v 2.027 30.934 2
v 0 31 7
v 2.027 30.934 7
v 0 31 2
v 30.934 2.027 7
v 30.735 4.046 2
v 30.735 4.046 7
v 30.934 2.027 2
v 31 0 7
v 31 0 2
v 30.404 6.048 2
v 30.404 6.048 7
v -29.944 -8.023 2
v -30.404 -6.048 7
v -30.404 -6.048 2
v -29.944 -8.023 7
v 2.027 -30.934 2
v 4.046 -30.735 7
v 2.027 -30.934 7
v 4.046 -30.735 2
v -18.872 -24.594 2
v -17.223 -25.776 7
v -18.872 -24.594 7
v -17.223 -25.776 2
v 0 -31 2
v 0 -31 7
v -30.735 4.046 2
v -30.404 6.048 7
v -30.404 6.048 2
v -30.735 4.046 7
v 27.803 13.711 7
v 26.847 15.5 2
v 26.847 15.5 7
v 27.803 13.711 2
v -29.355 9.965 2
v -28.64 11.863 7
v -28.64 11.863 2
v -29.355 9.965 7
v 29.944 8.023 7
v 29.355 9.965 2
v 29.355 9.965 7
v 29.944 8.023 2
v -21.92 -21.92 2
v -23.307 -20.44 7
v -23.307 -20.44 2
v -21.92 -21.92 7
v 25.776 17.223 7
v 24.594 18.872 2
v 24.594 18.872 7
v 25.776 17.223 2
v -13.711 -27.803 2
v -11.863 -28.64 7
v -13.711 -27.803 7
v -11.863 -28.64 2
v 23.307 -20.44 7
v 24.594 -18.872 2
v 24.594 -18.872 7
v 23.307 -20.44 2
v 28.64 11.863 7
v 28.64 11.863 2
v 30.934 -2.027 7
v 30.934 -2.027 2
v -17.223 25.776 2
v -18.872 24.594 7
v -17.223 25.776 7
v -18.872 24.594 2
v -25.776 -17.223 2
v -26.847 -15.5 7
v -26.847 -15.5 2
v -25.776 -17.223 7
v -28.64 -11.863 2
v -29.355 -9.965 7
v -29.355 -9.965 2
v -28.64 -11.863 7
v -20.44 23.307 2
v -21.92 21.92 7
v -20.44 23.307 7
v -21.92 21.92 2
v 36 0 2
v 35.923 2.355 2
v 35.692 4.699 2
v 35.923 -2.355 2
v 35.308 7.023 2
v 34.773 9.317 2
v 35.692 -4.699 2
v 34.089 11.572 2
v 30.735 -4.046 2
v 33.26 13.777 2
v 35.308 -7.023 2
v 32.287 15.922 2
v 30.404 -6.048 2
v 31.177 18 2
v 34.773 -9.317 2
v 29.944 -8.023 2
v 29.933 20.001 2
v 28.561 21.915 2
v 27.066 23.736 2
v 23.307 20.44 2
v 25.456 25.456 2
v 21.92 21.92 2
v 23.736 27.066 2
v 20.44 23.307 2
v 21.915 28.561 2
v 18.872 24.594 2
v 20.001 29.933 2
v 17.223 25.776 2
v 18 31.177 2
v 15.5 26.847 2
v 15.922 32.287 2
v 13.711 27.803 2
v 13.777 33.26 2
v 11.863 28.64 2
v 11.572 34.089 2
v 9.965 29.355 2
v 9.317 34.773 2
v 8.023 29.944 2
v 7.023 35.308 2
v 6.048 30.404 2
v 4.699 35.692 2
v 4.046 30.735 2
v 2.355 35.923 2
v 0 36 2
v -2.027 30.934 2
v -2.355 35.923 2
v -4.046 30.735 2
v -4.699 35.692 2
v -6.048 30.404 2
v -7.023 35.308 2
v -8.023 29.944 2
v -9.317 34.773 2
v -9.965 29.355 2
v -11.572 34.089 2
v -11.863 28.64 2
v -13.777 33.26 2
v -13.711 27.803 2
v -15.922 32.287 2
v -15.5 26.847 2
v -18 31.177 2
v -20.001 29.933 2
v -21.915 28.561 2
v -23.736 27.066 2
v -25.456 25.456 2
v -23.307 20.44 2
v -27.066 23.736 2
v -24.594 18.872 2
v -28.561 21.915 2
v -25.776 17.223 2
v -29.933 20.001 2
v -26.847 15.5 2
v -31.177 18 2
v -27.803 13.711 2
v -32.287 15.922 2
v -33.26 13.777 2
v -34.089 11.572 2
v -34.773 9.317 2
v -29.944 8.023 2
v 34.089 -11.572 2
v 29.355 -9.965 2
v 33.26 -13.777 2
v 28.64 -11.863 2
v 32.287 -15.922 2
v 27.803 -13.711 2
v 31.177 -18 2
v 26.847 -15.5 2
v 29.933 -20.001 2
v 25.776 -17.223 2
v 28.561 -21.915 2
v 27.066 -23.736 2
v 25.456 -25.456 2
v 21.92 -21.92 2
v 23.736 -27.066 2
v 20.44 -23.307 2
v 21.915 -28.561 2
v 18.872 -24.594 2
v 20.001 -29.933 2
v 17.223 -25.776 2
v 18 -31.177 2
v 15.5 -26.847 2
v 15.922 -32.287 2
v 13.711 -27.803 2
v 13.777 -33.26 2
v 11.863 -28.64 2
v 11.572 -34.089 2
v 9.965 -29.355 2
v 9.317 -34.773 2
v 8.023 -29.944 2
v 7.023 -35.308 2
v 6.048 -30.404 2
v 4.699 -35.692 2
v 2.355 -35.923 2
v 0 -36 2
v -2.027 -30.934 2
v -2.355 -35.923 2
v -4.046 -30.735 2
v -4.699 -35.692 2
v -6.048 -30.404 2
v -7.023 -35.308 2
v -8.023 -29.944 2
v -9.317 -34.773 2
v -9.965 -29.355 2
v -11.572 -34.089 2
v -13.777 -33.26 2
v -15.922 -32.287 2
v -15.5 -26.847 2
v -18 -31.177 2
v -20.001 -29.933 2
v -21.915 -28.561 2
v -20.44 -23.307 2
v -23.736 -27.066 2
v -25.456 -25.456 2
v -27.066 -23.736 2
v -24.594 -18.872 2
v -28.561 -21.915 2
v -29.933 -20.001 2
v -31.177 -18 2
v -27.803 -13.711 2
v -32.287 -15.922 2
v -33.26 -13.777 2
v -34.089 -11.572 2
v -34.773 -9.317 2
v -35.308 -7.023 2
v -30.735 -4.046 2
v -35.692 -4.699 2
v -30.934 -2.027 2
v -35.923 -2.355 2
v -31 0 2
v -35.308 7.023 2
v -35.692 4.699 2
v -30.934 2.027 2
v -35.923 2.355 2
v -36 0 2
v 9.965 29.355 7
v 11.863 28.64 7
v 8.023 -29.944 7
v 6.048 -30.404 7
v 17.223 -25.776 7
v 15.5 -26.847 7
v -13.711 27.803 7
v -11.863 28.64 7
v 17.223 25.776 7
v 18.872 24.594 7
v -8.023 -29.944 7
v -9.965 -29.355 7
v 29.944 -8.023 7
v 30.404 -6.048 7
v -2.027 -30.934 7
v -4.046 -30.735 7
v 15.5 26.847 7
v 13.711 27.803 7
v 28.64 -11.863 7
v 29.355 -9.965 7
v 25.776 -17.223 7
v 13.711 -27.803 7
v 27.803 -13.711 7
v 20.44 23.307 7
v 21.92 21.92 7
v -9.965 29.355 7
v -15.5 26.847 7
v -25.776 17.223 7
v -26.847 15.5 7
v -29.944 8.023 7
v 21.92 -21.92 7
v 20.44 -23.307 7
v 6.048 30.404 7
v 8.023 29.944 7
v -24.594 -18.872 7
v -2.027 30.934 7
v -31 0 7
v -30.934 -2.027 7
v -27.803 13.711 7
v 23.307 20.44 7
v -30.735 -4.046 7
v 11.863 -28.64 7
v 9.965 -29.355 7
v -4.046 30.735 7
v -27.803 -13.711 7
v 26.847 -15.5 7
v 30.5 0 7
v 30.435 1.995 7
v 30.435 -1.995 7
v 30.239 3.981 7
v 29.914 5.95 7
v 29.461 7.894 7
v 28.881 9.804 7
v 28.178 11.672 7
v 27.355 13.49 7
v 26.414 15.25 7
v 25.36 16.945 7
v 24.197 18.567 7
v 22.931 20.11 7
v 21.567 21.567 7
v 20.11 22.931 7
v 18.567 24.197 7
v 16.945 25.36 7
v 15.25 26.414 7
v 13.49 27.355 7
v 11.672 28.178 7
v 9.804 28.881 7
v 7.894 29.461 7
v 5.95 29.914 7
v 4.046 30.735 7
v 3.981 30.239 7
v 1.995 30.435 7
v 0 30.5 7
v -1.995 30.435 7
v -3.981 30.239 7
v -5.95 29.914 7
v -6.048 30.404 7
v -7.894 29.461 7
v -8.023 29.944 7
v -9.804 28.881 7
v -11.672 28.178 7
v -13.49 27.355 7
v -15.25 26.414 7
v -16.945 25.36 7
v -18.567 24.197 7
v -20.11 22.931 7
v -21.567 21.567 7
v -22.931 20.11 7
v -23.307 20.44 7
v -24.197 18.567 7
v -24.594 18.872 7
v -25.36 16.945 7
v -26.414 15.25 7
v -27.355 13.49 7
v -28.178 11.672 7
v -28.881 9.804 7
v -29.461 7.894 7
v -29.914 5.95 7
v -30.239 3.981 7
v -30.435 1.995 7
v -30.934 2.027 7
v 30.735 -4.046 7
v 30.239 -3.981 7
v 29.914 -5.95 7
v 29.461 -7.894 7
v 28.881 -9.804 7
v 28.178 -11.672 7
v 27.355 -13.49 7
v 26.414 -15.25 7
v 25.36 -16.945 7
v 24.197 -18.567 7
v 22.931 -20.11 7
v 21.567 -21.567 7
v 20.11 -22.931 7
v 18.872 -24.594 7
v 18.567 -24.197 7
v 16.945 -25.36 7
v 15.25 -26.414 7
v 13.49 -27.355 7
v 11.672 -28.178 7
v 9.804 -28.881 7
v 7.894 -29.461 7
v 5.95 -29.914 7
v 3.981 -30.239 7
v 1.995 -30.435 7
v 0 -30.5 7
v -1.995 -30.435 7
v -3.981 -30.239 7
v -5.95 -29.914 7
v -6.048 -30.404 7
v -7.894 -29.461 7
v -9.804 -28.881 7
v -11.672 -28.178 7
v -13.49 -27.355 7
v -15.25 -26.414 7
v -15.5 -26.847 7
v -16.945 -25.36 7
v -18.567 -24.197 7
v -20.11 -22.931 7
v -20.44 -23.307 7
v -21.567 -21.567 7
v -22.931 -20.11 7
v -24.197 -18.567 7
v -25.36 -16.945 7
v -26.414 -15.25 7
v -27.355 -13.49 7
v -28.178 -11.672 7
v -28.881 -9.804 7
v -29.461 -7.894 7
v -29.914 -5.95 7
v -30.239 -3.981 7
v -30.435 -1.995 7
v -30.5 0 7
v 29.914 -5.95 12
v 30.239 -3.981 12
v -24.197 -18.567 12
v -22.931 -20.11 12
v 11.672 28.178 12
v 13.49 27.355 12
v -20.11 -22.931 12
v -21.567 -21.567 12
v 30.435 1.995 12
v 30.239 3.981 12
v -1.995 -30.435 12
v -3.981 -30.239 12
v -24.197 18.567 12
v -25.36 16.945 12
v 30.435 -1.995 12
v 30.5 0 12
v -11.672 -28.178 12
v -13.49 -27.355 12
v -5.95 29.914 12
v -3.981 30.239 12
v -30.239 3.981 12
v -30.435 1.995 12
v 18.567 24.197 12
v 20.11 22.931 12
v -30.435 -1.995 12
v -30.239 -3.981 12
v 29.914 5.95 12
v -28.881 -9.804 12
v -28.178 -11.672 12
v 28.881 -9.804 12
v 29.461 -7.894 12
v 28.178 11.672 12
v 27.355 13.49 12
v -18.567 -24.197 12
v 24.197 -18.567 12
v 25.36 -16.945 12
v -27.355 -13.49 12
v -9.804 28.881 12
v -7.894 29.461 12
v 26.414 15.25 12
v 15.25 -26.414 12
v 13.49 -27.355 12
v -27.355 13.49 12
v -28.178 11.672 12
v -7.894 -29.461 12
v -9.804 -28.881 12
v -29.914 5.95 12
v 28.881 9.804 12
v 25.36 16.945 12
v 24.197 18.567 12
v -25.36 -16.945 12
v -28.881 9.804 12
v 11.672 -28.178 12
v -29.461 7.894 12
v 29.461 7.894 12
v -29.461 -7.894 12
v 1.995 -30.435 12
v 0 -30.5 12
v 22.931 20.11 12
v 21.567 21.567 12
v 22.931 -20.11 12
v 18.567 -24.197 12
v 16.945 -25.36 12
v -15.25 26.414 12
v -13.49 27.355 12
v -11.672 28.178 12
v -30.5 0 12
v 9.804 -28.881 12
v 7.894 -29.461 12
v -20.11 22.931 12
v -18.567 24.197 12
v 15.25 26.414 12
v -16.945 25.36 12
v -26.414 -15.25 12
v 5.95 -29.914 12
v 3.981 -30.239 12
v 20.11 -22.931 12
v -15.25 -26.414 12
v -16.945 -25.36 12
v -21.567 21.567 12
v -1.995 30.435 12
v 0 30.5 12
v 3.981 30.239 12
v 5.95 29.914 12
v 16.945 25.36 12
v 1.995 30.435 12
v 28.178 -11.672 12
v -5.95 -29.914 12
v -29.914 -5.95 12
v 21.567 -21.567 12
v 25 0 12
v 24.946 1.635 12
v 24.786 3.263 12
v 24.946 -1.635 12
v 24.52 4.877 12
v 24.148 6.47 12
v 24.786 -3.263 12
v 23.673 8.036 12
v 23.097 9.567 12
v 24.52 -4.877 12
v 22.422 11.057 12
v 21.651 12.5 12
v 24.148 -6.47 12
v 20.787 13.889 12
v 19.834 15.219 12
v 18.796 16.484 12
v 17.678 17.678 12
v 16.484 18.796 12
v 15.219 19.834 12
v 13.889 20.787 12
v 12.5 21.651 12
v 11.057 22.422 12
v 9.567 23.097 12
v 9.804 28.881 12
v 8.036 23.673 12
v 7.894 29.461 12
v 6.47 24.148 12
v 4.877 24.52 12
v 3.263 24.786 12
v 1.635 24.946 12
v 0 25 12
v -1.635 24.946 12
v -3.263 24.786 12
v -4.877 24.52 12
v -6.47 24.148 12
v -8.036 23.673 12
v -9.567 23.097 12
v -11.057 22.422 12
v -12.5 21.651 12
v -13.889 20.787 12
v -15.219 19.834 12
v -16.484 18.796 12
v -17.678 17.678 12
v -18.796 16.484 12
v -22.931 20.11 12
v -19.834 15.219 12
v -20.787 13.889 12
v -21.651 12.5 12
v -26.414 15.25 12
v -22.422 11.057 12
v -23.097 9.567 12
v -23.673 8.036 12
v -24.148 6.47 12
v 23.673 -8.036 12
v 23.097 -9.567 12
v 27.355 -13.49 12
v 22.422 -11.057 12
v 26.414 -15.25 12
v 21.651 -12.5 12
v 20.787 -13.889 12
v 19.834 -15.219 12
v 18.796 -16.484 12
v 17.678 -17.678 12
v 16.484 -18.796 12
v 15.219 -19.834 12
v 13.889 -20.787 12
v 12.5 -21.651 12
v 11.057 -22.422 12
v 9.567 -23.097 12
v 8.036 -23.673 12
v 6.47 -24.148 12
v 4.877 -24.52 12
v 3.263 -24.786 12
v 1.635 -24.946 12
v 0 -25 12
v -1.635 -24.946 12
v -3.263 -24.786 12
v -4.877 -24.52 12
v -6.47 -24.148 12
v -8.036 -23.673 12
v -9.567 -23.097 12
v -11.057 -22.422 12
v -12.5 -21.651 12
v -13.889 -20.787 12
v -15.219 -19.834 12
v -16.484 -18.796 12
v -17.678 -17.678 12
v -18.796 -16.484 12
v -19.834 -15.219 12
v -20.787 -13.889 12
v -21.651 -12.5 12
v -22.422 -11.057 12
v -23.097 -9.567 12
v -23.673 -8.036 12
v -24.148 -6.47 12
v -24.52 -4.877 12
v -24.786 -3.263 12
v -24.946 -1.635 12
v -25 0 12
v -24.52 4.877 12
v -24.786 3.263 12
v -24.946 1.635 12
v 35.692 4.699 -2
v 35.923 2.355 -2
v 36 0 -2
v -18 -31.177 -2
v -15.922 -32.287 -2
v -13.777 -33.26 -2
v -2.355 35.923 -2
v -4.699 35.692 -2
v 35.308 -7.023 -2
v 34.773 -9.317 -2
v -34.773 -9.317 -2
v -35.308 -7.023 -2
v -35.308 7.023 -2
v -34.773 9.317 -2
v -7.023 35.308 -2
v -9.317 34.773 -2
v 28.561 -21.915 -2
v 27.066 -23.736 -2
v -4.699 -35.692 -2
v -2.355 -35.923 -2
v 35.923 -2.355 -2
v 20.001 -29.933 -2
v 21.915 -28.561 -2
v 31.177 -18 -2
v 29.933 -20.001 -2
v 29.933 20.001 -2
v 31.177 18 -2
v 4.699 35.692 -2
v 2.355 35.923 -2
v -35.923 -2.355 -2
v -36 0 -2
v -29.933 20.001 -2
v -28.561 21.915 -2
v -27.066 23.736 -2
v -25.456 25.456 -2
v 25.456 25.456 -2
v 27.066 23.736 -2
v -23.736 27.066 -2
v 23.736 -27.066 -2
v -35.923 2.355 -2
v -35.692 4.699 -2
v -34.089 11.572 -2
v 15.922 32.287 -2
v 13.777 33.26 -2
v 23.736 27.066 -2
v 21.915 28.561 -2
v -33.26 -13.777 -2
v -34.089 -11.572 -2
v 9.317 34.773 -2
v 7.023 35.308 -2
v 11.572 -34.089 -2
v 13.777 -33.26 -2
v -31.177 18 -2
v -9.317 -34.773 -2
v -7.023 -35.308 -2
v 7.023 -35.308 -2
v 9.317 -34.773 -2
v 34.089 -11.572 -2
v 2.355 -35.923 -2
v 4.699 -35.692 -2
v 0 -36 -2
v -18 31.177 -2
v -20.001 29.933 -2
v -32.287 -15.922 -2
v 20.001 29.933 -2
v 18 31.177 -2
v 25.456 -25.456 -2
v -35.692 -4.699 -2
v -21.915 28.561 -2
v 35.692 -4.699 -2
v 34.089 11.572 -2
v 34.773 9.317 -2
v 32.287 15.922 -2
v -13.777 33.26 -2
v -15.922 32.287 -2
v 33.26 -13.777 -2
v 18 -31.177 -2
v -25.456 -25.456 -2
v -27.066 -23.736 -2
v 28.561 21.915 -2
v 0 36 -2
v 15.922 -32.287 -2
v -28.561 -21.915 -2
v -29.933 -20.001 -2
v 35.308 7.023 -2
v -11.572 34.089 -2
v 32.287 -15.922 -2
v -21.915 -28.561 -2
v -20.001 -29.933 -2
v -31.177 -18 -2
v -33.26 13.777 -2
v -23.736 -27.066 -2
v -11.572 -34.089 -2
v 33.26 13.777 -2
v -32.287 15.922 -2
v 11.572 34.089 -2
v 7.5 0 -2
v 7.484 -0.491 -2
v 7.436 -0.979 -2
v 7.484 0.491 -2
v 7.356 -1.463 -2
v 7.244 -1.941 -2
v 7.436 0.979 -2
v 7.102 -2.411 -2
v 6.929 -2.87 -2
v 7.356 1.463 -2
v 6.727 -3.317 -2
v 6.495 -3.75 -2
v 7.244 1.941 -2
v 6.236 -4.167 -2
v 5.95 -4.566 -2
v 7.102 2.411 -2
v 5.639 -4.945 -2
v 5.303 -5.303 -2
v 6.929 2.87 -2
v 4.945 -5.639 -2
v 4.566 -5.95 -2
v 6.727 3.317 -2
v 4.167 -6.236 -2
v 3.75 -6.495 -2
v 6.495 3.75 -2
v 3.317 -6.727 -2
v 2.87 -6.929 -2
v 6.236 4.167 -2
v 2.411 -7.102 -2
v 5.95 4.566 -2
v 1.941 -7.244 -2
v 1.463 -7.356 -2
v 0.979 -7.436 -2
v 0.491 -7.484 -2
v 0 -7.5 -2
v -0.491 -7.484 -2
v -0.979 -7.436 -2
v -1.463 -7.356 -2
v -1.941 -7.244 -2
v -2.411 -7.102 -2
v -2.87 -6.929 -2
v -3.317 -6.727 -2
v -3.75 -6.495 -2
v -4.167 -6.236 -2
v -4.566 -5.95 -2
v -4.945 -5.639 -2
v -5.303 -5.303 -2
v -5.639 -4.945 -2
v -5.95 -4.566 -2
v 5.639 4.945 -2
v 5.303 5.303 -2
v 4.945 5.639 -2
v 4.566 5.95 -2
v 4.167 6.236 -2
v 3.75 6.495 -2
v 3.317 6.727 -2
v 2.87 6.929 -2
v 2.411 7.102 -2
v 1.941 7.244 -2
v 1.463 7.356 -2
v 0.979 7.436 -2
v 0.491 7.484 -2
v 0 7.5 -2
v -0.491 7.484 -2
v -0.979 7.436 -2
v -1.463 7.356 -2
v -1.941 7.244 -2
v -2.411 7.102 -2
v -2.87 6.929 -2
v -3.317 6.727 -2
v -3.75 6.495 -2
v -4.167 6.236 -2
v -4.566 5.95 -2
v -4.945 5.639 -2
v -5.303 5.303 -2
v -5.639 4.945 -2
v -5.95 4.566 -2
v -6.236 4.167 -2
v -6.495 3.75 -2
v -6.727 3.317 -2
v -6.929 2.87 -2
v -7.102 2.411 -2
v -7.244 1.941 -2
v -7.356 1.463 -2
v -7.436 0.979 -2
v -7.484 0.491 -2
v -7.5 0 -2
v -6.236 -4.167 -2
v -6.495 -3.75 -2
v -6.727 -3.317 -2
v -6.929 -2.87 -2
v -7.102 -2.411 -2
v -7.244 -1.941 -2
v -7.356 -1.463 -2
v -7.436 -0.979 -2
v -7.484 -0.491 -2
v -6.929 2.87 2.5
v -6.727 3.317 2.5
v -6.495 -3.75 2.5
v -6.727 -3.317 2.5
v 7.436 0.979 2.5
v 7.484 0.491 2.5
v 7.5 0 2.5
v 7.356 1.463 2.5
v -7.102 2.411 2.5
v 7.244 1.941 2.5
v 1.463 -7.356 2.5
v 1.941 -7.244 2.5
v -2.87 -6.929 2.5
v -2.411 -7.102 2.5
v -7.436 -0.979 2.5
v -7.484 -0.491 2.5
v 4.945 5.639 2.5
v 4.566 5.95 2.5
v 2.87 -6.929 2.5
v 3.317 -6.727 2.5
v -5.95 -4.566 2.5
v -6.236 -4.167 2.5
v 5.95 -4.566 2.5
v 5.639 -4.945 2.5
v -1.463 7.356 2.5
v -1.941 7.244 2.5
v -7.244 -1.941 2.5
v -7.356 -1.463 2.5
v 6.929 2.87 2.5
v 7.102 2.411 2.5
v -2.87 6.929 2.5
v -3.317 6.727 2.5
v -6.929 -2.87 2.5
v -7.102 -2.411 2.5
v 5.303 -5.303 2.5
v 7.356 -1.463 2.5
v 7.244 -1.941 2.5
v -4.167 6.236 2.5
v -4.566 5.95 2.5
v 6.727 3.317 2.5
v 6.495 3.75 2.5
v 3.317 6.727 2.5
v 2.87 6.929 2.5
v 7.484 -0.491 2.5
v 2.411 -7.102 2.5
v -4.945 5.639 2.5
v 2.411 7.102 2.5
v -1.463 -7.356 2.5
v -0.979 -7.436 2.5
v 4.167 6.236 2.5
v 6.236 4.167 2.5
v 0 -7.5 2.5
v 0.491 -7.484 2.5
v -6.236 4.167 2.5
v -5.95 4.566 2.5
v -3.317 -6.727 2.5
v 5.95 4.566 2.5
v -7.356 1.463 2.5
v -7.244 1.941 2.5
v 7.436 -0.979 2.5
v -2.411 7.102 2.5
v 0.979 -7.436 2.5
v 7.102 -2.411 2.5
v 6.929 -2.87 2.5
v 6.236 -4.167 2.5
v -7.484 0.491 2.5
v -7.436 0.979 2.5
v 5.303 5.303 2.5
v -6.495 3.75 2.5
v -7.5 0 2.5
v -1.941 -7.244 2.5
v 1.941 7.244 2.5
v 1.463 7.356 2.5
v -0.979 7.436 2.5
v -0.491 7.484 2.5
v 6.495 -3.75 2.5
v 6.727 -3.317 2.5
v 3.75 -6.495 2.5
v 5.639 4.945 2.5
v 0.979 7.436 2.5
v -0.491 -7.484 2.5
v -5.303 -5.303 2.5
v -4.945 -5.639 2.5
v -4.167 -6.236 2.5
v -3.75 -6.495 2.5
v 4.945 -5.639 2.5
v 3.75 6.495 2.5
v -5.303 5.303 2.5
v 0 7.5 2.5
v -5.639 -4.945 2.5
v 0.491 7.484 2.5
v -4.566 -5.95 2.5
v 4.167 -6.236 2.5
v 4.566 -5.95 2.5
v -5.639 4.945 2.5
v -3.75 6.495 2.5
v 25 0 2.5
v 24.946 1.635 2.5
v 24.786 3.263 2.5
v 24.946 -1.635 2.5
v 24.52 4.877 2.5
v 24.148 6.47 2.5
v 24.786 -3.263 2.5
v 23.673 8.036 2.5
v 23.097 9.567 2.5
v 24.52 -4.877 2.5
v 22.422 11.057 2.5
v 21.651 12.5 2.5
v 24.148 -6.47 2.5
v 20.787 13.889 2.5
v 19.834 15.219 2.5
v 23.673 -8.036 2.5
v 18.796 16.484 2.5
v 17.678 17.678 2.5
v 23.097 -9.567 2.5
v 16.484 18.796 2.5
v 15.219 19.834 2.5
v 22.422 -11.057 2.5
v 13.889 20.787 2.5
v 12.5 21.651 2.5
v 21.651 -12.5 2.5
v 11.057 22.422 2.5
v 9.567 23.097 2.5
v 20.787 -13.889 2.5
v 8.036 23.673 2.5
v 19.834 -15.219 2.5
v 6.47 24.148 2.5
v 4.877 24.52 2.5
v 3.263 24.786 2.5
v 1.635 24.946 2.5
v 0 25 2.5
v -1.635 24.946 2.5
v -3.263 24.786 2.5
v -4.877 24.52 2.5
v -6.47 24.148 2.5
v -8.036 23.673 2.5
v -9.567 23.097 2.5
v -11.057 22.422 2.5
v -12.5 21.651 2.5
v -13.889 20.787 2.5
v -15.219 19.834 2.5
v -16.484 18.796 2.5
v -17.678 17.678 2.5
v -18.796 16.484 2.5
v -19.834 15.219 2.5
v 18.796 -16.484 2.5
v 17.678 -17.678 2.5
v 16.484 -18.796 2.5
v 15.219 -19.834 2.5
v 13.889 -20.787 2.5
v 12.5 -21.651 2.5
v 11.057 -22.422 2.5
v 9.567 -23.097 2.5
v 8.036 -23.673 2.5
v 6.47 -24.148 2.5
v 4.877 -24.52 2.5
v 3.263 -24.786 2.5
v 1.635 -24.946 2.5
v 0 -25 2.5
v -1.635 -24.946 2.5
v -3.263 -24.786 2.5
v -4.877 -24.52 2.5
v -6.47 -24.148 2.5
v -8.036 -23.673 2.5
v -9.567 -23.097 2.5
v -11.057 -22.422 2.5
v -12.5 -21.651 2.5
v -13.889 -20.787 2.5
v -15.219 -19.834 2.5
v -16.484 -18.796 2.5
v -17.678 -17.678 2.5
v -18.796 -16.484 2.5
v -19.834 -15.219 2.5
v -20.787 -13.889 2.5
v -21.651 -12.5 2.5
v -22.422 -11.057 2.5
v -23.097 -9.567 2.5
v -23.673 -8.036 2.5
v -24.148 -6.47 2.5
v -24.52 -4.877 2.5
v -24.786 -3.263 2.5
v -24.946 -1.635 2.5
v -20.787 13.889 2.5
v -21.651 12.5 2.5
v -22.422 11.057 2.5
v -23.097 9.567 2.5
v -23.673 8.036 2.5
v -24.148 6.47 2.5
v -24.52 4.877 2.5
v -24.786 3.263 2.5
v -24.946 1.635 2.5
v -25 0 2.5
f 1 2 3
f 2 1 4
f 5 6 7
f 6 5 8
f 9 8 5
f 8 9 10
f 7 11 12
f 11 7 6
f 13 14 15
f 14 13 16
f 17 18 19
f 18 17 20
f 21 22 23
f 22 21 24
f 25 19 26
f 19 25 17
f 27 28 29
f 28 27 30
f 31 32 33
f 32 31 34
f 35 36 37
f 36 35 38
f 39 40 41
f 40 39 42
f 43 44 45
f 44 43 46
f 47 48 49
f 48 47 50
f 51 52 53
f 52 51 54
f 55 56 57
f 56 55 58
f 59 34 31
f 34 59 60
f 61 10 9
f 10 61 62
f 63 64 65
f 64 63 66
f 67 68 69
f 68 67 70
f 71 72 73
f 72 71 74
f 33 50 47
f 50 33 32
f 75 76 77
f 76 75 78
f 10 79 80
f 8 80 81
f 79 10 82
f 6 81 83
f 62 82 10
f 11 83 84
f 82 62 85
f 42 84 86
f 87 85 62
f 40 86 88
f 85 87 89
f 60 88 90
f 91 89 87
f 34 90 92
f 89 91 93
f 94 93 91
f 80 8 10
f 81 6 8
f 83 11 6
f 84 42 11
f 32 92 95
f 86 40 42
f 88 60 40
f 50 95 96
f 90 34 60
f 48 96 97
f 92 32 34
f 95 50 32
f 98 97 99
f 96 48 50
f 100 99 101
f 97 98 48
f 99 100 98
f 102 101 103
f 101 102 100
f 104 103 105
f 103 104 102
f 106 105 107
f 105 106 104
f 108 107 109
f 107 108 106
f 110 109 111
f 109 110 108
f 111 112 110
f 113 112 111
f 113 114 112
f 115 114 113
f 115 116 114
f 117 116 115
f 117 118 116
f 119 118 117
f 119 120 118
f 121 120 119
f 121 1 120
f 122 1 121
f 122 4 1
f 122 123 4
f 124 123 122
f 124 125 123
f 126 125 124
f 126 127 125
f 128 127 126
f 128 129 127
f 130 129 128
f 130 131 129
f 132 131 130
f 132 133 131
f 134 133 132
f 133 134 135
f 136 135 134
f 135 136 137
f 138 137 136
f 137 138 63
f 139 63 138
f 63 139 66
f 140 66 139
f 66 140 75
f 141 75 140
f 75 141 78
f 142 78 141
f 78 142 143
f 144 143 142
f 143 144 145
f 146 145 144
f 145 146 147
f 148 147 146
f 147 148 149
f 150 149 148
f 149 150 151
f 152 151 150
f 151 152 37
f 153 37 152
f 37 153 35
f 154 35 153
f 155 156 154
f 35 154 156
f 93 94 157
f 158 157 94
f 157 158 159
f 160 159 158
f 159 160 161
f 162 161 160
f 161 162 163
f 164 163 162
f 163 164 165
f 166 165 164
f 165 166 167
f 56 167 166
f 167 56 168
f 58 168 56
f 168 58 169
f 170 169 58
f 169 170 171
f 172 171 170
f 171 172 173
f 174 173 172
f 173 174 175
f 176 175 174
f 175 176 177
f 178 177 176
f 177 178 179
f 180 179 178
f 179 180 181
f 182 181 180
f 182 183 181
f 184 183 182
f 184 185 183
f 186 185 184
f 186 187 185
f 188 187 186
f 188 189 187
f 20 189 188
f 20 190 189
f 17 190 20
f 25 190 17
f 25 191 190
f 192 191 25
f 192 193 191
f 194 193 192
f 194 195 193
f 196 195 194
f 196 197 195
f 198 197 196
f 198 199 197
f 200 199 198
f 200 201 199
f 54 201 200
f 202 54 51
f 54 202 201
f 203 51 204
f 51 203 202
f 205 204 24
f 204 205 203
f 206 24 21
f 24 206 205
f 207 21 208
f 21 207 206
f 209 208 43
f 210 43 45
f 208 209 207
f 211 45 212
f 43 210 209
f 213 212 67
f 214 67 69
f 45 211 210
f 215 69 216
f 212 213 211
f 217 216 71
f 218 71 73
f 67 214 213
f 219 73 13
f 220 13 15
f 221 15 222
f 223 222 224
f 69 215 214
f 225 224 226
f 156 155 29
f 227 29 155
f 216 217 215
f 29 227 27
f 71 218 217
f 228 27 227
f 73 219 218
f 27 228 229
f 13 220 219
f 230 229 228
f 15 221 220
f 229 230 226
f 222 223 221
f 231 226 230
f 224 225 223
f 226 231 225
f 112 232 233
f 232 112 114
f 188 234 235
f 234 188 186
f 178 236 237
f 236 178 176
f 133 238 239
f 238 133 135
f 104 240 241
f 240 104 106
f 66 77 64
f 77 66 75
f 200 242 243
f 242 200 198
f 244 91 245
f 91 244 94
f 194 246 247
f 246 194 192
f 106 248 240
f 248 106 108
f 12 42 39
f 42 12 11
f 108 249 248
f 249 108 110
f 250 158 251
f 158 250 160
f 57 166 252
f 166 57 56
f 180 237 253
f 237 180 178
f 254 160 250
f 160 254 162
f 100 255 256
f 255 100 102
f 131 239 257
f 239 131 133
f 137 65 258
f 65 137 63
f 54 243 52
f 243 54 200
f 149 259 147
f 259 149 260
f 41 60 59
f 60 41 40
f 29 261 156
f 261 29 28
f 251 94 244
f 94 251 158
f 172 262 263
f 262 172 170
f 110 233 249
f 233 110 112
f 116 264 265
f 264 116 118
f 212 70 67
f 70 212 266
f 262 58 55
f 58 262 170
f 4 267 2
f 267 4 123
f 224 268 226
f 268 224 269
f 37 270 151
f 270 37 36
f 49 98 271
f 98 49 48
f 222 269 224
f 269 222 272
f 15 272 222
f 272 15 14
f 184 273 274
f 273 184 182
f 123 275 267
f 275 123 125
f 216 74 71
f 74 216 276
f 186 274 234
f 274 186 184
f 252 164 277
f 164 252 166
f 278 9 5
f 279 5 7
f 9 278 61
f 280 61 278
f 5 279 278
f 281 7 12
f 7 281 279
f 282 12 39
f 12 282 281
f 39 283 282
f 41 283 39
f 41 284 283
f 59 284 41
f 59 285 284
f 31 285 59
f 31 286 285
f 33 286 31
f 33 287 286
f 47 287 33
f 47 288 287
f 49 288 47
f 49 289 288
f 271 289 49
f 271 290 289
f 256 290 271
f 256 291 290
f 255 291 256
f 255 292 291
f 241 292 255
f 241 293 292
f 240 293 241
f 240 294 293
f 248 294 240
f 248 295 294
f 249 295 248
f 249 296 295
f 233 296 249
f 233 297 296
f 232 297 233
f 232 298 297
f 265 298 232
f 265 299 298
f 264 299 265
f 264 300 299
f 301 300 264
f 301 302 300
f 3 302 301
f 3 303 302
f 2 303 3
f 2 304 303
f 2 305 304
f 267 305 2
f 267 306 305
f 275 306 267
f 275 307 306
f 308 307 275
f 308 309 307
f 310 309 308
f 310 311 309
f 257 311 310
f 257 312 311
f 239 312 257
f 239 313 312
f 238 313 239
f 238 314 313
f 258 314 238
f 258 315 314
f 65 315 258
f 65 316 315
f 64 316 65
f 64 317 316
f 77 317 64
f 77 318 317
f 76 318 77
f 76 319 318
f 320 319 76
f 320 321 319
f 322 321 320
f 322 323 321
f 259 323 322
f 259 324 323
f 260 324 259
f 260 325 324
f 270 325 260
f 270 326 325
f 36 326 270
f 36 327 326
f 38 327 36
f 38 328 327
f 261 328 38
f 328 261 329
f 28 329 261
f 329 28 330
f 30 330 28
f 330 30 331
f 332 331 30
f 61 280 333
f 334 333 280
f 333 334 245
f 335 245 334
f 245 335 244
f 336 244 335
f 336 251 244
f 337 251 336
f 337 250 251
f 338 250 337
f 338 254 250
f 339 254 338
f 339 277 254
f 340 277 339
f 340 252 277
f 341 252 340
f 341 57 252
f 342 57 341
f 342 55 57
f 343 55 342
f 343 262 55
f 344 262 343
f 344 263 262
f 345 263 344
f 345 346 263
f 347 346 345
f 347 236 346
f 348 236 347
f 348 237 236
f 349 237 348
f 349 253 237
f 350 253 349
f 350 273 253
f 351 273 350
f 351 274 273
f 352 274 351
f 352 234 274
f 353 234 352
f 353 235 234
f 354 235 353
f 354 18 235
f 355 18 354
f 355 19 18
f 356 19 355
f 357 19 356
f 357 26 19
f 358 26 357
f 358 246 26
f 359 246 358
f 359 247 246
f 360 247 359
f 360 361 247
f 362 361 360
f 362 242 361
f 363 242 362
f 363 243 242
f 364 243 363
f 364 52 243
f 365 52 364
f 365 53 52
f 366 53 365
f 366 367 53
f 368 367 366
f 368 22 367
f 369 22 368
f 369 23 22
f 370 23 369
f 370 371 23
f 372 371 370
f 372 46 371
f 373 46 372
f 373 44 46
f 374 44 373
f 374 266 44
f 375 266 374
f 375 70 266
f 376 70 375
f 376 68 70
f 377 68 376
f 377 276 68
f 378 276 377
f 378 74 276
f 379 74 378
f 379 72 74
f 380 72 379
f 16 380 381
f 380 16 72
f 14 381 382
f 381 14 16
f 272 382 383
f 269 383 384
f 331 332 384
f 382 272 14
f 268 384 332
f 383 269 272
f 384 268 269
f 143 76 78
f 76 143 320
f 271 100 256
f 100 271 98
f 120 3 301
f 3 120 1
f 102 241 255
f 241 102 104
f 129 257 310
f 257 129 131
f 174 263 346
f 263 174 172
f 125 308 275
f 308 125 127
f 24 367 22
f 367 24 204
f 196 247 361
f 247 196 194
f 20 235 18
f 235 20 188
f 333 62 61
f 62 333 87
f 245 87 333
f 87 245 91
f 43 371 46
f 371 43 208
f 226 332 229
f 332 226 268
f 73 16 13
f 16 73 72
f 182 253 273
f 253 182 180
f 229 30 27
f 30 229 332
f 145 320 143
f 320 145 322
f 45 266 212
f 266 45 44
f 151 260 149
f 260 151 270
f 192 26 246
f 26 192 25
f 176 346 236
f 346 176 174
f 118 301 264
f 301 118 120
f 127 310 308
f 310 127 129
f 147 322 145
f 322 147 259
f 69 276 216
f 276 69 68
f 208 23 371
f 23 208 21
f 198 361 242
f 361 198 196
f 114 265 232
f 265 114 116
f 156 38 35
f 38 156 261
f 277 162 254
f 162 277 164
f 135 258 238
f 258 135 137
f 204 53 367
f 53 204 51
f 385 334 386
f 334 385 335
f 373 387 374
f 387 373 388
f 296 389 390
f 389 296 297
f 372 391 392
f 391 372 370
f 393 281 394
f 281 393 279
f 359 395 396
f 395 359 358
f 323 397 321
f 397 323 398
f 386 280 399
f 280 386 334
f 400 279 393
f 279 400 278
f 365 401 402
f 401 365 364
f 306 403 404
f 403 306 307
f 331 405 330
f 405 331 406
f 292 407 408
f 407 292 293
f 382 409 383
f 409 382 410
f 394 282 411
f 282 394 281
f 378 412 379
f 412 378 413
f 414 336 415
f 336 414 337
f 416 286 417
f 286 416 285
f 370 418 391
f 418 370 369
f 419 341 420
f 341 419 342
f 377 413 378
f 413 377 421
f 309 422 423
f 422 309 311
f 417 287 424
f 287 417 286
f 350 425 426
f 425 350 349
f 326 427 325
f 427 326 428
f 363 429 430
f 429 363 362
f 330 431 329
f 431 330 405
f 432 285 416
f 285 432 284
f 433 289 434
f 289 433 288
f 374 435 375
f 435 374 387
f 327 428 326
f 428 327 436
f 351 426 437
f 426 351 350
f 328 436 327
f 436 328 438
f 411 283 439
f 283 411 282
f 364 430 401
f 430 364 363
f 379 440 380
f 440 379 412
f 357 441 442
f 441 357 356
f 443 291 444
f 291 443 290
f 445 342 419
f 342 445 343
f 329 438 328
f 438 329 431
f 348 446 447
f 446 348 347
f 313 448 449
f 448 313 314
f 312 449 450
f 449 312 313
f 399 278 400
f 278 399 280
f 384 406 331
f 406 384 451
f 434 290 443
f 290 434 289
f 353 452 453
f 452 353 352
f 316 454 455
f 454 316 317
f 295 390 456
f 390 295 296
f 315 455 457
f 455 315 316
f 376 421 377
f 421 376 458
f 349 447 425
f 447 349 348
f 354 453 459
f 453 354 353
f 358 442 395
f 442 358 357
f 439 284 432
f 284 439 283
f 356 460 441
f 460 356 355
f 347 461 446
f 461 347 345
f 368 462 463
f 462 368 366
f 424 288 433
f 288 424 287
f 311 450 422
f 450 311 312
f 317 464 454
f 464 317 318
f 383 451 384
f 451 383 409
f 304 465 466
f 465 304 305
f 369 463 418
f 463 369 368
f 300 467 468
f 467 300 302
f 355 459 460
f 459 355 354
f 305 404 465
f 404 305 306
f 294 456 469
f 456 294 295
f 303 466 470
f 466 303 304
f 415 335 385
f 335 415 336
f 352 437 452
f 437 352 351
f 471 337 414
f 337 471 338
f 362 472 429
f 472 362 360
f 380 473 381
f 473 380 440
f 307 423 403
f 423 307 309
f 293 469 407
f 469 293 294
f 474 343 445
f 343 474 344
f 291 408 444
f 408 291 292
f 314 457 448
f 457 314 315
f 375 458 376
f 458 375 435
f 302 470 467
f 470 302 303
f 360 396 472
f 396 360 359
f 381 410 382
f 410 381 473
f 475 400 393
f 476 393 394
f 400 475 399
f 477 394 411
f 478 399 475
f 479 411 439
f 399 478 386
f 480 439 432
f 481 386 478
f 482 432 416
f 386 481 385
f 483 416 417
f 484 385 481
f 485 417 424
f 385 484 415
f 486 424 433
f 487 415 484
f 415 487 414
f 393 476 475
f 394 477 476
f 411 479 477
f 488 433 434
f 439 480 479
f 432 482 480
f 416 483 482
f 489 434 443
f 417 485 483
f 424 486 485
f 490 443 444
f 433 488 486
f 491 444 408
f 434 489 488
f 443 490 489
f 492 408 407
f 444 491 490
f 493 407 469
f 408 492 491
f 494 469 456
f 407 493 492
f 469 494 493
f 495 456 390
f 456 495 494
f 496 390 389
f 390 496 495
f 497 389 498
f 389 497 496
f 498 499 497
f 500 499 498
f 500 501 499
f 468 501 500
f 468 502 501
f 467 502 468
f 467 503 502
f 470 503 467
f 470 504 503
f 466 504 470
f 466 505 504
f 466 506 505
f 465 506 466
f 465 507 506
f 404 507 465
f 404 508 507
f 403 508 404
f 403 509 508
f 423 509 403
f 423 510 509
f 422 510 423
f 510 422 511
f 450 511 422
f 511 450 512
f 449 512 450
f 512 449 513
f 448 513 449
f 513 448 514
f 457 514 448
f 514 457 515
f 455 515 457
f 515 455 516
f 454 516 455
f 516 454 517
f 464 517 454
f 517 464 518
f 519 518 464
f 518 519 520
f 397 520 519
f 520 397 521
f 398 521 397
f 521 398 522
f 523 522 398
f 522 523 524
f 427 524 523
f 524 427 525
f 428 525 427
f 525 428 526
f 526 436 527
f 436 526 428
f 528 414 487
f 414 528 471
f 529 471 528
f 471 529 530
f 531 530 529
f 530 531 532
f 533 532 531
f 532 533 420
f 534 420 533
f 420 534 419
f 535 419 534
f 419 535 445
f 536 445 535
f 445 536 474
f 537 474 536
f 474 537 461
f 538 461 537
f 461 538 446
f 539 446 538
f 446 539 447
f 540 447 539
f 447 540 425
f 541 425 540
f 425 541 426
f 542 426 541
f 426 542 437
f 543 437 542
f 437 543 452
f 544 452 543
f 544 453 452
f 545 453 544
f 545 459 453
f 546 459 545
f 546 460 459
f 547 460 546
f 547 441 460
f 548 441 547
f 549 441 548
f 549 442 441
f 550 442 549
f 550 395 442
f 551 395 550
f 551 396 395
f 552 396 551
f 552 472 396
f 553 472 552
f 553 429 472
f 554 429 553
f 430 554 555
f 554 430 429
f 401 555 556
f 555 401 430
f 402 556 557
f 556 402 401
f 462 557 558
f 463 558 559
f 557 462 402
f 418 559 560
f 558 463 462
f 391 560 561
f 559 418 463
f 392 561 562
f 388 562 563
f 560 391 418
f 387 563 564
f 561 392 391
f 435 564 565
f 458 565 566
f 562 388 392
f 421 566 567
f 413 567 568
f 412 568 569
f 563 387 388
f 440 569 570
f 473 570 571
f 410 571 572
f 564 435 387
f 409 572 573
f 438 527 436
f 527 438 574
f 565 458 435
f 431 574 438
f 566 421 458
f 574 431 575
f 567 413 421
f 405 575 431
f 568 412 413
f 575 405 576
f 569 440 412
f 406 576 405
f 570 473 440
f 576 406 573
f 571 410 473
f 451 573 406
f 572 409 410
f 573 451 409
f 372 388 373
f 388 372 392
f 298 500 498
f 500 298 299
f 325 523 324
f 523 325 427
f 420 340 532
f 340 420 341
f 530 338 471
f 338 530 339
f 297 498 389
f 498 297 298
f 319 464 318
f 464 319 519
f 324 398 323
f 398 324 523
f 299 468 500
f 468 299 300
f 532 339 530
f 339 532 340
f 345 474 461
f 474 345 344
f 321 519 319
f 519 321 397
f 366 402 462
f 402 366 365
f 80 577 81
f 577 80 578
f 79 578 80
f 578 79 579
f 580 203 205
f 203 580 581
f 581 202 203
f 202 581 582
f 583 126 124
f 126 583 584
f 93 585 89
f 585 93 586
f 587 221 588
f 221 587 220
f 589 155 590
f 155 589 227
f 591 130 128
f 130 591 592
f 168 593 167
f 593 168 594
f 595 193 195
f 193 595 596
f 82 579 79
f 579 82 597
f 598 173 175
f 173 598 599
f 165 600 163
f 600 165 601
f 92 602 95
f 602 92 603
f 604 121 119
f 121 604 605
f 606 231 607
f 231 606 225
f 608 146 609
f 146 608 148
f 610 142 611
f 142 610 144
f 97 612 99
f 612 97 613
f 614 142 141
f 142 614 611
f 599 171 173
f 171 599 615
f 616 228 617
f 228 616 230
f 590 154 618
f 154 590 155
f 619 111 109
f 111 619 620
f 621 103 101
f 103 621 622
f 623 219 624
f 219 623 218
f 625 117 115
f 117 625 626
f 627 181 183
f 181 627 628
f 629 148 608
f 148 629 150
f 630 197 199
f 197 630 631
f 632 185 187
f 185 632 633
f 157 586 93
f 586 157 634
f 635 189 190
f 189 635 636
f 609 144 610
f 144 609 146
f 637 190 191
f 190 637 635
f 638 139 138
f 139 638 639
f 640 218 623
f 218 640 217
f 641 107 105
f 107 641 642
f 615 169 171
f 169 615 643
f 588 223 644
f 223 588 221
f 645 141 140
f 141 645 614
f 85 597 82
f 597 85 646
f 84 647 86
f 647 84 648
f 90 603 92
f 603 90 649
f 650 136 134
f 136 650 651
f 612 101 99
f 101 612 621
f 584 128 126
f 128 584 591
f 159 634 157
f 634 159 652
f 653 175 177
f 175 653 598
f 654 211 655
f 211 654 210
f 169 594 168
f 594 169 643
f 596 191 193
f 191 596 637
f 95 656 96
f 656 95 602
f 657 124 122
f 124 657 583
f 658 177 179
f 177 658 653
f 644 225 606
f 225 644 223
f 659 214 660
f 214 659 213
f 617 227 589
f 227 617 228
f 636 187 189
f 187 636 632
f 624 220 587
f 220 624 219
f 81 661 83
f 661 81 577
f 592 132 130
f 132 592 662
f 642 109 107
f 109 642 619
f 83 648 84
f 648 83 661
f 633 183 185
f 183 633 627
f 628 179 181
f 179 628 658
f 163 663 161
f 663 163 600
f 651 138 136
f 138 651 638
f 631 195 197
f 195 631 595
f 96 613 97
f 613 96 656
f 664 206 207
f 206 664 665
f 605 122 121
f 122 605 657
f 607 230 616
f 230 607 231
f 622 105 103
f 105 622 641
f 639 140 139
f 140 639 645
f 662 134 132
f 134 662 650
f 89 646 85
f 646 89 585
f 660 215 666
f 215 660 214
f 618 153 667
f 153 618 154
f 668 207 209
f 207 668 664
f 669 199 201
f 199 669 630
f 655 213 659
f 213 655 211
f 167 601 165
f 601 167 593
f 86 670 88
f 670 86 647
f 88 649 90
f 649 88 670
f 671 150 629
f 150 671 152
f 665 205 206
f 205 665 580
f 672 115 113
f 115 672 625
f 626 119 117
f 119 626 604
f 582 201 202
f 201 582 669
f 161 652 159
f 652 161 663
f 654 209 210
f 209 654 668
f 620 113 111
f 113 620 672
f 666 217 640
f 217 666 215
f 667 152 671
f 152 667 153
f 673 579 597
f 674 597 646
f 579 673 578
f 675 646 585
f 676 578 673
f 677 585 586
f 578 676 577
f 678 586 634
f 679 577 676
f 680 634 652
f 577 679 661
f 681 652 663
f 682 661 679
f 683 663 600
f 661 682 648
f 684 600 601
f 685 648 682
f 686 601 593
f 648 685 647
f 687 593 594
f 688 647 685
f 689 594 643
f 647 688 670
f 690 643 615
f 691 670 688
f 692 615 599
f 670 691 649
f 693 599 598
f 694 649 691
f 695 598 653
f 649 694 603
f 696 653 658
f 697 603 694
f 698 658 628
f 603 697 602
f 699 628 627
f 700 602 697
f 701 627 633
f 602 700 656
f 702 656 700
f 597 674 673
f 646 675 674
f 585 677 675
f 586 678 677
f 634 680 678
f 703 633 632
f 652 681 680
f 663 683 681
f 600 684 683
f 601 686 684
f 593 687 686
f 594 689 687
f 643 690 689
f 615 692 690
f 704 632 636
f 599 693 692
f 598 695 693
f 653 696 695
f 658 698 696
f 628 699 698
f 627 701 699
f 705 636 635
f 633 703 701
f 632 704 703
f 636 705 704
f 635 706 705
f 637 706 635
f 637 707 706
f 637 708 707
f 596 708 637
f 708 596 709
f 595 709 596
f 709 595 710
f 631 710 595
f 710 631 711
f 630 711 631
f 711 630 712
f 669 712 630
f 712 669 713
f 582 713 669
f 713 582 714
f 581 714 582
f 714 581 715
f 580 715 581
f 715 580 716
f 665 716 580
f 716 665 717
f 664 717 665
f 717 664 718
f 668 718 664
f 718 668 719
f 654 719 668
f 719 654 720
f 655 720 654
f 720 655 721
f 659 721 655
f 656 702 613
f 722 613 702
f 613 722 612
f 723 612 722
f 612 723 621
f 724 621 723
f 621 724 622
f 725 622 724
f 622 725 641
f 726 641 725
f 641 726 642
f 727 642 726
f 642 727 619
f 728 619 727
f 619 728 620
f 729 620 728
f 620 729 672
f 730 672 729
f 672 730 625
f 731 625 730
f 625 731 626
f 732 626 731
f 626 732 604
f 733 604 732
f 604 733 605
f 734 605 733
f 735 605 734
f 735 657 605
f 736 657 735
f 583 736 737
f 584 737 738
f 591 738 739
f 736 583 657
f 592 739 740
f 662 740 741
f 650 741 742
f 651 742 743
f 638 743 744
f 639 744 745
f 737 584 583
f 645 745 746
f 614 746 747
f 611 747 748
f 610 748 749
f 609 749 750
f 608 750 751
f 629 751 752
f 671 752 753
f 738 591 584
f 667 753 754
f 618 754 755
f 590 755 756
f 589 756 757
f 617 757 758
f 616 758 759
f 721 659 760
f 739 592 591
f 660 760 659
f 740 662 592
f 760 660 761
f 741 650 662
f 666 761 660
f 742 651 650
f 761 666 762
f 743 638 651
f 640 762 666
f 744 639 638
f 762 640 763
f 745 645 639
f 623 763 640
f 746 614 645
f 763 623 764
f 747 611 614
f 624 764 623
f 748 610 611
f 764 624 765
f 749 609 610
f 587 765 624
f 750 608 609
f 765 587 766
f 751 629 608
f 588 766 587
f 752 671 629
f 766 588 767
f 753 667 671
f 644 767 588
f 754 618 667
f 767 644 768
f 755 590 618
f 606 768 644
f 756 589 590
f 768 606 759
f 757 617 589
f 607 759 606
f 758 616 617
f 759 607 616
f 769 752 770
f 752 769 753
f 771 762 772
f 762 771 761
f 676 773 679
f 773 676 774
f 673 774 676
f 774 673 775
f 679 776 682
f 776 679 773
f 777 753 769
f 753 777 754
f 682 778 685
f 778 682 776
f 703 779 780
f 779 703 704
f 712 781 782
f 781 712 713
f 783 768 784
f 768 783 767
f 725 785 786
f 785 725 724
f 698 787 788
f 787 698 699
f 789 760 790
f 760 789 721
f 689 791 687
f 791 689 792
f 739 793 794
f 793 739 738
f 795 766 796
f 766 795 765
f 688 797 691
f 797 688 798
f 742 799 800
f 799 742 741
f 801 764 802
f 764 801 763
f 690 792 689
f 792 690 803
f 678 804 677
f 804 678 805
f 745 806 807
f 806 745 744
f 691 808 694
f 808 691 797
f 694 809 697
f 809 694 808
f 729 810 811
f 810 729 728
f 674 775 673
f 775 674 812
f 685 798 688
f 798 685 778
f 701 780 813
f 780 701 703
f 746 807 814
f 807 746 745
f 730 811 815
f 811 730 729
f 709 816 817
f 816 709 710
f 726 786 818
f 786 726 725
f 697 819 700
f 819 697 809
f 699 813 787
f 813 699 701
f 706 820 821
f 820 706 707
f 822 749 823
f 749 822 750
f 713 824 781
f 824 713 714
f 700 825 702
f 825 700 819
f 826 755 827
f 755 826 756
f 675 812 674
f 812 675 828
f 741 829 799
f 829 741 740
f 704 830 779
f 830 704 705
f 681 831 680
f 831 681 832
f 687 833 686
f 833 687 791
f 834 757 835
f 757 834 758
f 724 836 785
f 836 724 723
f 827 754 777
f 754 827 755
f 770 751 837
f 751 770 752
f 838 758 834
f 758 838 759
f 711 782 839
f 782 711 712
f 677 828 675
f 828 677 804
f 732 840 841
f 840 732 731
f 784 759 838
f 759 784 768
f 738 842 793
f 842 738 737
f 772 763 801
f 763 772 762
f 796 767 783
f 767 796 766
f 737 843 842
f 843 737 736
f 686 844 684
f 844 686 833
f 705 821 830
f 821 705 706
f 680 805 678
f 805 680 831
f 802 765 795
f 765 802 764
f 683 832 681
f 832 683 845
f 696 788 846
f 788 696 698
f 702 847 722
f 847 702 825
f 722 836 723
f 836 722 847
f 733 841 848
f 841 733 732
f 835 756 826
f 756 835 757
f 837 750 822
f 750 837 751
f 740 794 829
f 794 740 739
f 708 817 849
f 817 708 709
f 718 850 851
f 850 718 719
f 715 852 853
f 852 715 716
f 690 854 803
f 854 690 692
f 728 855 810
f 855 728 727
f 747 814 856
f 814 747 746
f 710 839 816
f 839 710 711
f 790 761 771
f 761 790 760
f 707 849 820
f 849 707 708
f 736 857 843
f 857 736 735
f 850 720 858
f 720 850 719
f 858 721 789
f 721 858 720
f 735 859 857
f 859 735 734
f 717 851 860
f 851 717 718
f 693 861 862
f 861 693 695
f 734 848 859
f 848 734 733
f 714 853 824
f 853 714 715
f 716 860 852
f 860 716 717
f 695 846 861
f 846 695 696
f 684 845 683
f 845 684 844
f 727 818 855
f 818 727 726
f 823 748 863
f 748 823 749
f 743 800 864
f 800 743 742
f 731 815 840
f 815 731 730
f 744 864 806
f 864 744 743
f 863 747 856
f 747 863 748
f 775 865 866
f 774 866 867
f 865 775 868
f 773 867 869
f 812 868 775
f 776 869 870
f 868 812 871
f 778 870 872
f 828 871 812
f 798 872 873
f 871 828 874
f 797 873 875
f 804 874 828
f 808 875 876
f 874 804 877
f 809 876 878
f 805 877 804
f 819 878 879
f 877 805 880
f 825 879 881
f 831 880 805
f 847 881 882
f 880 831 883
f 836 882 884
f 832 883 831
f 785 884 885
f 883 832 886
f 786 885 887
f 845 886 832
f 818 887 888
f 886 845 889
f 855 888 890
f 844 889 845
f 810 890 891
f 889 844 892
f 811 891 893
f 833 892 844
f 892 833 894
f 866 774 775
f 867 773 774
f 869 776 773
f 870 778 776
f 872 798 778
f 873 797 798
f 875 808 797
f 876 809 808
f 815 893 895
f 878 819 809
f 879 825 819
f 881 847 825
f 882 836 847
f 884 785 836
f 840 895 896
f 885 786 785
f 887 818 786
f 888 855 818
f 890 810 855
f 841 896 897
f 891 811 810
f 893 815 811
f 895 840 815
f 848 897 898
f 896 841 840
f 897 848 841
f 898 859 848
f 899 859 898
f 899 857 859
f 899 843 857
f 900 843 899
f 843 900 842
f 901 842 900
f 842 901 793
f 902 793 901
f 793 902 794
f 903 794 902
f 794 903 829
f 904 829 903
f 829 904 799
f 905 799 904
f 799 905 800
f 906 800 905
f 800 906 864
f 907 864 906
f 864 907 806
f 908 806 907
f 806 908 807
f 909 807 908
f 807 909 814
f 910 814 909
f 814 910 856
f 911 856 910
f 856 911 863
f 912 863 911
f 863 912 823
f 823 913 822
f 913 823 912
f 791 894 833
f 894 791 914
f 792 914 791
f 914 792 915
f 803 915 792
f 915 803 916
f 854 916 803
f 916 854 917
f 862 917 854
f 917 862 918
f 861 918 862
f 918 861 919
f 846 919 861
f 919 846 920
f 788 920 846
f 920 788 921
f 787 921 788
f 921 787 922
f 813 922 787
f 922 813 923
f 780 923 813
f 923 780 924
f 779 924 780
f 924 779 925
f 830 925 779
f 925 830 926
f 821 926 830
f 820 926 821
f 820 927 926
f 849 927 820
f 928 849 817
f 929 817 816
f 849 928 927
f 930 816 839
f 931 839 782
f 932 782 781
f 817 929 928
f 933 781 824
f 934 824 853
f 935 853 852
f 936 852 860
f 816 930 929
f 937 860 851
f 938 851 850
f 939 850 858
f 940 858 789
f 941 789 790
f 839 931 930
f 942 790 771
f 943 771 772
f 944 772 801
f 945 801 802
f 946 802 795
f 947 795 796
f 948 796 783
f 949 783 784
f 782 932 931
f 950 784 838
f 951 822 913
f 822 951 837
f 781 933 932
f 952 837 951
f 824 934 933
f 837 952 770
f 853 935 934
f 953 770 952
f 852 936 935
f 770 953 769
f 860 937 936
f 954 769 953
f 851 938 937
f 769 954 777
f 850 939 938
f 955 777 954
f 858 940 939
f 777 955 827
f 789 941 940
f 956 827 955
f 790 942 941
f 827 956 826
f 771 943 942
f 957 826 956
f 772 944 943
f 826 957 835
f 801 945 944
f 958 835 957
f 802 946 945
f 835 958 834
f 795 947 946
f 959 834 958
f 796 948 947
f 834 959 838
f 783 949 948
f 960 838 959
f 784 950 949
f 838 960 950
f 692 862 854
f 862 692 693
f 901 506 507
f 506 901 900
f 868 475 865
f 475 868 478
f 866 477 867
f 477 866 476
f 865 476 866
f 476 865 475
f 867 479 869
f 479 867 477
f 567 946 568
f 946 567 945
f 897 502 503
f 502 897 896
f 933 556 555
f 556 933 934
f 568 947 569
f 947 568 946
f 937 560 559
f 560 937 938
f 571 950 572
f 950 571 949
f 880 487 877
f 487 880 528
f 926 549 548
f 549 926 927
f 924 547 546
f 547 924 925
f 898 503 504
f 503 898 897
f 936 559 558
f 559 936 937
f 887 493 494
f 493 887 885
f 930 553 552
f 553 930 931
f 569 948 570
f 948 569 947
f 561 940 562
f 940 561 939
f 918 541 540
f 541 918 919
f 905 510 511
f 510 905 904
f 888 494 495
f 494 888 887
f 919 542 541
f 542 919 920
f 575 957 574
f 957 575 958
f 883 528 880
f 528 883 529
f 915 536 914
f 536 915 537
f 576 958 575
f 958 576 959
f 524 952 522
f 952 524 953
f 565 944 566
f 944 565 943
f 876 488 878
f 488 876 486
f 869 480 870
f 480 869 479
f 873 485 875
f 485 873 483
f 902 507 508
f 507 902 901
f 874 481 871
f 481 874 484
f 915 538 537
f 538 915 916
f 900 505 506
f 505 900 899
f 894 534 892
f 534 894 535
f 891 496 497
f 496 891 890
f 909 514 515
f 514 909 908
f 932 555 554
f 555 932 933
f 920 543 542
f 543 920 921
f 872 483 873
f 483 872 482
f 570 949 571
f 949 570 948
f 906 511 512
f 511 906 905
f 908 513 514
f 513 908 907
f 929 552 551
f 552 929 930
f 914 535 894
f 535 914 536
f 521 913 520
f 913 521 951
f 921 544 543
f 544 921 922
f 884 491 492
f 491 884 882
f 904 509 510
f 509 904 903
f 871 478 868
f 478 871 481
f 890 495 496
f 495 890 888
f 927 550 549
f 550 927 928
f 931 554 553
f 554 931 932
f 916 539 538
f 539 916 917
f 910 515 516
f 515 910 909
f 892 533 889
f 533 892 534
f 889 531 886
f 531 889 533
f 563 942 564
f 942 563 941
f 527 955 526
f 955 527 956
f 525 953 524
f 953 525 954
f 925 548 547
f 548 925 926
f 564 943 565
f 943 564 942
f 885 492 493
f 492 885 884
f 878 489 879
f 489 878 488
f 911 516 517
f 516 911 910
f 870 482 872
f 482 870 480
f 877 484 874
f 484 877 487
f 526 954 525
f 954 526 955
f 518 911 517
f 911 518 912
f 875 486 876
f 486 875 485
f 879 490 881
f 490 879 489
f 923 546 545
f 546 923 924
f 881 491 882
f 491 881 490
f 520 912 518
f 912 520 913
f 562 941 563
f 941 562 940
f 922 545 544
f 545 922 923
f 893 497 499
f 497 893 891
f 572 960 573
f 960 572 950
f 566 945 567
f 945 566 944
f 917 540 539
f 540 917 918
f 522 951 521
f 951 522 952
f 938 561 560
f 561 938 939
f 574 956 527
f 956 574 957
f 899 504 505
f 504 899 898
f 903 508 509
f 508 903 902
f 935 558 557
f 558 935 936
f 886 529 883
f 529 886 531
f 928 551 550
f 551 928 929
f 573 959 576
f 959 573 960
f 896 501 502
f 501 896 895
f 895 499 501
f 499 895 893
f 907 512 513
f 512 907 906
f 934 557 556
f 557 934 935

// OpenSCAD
$fn=96;

cap_radius=31;
cap_height=5;
indent=25;
brush_hole=7.5;

difference()
{
    union()
    {
        cylinder(r=cap_radius+5, h=4, center=true);
        translate([0, 0, cap_height/2+2]) {
        cylinder(r=cap_radius, h=cap_height, center=true);
        translate([ 0, 0, cap_height])
        cylinder(r=cap_radius-.5, h=cap_height, center=true);
        }
    }
        #cylinder(r=brush_hole, h=cap_height, center=true);
        translate([ 0, 0, cap_height*2])
        cylinder(r=indent, h=cap_height*3, center=true);
}
